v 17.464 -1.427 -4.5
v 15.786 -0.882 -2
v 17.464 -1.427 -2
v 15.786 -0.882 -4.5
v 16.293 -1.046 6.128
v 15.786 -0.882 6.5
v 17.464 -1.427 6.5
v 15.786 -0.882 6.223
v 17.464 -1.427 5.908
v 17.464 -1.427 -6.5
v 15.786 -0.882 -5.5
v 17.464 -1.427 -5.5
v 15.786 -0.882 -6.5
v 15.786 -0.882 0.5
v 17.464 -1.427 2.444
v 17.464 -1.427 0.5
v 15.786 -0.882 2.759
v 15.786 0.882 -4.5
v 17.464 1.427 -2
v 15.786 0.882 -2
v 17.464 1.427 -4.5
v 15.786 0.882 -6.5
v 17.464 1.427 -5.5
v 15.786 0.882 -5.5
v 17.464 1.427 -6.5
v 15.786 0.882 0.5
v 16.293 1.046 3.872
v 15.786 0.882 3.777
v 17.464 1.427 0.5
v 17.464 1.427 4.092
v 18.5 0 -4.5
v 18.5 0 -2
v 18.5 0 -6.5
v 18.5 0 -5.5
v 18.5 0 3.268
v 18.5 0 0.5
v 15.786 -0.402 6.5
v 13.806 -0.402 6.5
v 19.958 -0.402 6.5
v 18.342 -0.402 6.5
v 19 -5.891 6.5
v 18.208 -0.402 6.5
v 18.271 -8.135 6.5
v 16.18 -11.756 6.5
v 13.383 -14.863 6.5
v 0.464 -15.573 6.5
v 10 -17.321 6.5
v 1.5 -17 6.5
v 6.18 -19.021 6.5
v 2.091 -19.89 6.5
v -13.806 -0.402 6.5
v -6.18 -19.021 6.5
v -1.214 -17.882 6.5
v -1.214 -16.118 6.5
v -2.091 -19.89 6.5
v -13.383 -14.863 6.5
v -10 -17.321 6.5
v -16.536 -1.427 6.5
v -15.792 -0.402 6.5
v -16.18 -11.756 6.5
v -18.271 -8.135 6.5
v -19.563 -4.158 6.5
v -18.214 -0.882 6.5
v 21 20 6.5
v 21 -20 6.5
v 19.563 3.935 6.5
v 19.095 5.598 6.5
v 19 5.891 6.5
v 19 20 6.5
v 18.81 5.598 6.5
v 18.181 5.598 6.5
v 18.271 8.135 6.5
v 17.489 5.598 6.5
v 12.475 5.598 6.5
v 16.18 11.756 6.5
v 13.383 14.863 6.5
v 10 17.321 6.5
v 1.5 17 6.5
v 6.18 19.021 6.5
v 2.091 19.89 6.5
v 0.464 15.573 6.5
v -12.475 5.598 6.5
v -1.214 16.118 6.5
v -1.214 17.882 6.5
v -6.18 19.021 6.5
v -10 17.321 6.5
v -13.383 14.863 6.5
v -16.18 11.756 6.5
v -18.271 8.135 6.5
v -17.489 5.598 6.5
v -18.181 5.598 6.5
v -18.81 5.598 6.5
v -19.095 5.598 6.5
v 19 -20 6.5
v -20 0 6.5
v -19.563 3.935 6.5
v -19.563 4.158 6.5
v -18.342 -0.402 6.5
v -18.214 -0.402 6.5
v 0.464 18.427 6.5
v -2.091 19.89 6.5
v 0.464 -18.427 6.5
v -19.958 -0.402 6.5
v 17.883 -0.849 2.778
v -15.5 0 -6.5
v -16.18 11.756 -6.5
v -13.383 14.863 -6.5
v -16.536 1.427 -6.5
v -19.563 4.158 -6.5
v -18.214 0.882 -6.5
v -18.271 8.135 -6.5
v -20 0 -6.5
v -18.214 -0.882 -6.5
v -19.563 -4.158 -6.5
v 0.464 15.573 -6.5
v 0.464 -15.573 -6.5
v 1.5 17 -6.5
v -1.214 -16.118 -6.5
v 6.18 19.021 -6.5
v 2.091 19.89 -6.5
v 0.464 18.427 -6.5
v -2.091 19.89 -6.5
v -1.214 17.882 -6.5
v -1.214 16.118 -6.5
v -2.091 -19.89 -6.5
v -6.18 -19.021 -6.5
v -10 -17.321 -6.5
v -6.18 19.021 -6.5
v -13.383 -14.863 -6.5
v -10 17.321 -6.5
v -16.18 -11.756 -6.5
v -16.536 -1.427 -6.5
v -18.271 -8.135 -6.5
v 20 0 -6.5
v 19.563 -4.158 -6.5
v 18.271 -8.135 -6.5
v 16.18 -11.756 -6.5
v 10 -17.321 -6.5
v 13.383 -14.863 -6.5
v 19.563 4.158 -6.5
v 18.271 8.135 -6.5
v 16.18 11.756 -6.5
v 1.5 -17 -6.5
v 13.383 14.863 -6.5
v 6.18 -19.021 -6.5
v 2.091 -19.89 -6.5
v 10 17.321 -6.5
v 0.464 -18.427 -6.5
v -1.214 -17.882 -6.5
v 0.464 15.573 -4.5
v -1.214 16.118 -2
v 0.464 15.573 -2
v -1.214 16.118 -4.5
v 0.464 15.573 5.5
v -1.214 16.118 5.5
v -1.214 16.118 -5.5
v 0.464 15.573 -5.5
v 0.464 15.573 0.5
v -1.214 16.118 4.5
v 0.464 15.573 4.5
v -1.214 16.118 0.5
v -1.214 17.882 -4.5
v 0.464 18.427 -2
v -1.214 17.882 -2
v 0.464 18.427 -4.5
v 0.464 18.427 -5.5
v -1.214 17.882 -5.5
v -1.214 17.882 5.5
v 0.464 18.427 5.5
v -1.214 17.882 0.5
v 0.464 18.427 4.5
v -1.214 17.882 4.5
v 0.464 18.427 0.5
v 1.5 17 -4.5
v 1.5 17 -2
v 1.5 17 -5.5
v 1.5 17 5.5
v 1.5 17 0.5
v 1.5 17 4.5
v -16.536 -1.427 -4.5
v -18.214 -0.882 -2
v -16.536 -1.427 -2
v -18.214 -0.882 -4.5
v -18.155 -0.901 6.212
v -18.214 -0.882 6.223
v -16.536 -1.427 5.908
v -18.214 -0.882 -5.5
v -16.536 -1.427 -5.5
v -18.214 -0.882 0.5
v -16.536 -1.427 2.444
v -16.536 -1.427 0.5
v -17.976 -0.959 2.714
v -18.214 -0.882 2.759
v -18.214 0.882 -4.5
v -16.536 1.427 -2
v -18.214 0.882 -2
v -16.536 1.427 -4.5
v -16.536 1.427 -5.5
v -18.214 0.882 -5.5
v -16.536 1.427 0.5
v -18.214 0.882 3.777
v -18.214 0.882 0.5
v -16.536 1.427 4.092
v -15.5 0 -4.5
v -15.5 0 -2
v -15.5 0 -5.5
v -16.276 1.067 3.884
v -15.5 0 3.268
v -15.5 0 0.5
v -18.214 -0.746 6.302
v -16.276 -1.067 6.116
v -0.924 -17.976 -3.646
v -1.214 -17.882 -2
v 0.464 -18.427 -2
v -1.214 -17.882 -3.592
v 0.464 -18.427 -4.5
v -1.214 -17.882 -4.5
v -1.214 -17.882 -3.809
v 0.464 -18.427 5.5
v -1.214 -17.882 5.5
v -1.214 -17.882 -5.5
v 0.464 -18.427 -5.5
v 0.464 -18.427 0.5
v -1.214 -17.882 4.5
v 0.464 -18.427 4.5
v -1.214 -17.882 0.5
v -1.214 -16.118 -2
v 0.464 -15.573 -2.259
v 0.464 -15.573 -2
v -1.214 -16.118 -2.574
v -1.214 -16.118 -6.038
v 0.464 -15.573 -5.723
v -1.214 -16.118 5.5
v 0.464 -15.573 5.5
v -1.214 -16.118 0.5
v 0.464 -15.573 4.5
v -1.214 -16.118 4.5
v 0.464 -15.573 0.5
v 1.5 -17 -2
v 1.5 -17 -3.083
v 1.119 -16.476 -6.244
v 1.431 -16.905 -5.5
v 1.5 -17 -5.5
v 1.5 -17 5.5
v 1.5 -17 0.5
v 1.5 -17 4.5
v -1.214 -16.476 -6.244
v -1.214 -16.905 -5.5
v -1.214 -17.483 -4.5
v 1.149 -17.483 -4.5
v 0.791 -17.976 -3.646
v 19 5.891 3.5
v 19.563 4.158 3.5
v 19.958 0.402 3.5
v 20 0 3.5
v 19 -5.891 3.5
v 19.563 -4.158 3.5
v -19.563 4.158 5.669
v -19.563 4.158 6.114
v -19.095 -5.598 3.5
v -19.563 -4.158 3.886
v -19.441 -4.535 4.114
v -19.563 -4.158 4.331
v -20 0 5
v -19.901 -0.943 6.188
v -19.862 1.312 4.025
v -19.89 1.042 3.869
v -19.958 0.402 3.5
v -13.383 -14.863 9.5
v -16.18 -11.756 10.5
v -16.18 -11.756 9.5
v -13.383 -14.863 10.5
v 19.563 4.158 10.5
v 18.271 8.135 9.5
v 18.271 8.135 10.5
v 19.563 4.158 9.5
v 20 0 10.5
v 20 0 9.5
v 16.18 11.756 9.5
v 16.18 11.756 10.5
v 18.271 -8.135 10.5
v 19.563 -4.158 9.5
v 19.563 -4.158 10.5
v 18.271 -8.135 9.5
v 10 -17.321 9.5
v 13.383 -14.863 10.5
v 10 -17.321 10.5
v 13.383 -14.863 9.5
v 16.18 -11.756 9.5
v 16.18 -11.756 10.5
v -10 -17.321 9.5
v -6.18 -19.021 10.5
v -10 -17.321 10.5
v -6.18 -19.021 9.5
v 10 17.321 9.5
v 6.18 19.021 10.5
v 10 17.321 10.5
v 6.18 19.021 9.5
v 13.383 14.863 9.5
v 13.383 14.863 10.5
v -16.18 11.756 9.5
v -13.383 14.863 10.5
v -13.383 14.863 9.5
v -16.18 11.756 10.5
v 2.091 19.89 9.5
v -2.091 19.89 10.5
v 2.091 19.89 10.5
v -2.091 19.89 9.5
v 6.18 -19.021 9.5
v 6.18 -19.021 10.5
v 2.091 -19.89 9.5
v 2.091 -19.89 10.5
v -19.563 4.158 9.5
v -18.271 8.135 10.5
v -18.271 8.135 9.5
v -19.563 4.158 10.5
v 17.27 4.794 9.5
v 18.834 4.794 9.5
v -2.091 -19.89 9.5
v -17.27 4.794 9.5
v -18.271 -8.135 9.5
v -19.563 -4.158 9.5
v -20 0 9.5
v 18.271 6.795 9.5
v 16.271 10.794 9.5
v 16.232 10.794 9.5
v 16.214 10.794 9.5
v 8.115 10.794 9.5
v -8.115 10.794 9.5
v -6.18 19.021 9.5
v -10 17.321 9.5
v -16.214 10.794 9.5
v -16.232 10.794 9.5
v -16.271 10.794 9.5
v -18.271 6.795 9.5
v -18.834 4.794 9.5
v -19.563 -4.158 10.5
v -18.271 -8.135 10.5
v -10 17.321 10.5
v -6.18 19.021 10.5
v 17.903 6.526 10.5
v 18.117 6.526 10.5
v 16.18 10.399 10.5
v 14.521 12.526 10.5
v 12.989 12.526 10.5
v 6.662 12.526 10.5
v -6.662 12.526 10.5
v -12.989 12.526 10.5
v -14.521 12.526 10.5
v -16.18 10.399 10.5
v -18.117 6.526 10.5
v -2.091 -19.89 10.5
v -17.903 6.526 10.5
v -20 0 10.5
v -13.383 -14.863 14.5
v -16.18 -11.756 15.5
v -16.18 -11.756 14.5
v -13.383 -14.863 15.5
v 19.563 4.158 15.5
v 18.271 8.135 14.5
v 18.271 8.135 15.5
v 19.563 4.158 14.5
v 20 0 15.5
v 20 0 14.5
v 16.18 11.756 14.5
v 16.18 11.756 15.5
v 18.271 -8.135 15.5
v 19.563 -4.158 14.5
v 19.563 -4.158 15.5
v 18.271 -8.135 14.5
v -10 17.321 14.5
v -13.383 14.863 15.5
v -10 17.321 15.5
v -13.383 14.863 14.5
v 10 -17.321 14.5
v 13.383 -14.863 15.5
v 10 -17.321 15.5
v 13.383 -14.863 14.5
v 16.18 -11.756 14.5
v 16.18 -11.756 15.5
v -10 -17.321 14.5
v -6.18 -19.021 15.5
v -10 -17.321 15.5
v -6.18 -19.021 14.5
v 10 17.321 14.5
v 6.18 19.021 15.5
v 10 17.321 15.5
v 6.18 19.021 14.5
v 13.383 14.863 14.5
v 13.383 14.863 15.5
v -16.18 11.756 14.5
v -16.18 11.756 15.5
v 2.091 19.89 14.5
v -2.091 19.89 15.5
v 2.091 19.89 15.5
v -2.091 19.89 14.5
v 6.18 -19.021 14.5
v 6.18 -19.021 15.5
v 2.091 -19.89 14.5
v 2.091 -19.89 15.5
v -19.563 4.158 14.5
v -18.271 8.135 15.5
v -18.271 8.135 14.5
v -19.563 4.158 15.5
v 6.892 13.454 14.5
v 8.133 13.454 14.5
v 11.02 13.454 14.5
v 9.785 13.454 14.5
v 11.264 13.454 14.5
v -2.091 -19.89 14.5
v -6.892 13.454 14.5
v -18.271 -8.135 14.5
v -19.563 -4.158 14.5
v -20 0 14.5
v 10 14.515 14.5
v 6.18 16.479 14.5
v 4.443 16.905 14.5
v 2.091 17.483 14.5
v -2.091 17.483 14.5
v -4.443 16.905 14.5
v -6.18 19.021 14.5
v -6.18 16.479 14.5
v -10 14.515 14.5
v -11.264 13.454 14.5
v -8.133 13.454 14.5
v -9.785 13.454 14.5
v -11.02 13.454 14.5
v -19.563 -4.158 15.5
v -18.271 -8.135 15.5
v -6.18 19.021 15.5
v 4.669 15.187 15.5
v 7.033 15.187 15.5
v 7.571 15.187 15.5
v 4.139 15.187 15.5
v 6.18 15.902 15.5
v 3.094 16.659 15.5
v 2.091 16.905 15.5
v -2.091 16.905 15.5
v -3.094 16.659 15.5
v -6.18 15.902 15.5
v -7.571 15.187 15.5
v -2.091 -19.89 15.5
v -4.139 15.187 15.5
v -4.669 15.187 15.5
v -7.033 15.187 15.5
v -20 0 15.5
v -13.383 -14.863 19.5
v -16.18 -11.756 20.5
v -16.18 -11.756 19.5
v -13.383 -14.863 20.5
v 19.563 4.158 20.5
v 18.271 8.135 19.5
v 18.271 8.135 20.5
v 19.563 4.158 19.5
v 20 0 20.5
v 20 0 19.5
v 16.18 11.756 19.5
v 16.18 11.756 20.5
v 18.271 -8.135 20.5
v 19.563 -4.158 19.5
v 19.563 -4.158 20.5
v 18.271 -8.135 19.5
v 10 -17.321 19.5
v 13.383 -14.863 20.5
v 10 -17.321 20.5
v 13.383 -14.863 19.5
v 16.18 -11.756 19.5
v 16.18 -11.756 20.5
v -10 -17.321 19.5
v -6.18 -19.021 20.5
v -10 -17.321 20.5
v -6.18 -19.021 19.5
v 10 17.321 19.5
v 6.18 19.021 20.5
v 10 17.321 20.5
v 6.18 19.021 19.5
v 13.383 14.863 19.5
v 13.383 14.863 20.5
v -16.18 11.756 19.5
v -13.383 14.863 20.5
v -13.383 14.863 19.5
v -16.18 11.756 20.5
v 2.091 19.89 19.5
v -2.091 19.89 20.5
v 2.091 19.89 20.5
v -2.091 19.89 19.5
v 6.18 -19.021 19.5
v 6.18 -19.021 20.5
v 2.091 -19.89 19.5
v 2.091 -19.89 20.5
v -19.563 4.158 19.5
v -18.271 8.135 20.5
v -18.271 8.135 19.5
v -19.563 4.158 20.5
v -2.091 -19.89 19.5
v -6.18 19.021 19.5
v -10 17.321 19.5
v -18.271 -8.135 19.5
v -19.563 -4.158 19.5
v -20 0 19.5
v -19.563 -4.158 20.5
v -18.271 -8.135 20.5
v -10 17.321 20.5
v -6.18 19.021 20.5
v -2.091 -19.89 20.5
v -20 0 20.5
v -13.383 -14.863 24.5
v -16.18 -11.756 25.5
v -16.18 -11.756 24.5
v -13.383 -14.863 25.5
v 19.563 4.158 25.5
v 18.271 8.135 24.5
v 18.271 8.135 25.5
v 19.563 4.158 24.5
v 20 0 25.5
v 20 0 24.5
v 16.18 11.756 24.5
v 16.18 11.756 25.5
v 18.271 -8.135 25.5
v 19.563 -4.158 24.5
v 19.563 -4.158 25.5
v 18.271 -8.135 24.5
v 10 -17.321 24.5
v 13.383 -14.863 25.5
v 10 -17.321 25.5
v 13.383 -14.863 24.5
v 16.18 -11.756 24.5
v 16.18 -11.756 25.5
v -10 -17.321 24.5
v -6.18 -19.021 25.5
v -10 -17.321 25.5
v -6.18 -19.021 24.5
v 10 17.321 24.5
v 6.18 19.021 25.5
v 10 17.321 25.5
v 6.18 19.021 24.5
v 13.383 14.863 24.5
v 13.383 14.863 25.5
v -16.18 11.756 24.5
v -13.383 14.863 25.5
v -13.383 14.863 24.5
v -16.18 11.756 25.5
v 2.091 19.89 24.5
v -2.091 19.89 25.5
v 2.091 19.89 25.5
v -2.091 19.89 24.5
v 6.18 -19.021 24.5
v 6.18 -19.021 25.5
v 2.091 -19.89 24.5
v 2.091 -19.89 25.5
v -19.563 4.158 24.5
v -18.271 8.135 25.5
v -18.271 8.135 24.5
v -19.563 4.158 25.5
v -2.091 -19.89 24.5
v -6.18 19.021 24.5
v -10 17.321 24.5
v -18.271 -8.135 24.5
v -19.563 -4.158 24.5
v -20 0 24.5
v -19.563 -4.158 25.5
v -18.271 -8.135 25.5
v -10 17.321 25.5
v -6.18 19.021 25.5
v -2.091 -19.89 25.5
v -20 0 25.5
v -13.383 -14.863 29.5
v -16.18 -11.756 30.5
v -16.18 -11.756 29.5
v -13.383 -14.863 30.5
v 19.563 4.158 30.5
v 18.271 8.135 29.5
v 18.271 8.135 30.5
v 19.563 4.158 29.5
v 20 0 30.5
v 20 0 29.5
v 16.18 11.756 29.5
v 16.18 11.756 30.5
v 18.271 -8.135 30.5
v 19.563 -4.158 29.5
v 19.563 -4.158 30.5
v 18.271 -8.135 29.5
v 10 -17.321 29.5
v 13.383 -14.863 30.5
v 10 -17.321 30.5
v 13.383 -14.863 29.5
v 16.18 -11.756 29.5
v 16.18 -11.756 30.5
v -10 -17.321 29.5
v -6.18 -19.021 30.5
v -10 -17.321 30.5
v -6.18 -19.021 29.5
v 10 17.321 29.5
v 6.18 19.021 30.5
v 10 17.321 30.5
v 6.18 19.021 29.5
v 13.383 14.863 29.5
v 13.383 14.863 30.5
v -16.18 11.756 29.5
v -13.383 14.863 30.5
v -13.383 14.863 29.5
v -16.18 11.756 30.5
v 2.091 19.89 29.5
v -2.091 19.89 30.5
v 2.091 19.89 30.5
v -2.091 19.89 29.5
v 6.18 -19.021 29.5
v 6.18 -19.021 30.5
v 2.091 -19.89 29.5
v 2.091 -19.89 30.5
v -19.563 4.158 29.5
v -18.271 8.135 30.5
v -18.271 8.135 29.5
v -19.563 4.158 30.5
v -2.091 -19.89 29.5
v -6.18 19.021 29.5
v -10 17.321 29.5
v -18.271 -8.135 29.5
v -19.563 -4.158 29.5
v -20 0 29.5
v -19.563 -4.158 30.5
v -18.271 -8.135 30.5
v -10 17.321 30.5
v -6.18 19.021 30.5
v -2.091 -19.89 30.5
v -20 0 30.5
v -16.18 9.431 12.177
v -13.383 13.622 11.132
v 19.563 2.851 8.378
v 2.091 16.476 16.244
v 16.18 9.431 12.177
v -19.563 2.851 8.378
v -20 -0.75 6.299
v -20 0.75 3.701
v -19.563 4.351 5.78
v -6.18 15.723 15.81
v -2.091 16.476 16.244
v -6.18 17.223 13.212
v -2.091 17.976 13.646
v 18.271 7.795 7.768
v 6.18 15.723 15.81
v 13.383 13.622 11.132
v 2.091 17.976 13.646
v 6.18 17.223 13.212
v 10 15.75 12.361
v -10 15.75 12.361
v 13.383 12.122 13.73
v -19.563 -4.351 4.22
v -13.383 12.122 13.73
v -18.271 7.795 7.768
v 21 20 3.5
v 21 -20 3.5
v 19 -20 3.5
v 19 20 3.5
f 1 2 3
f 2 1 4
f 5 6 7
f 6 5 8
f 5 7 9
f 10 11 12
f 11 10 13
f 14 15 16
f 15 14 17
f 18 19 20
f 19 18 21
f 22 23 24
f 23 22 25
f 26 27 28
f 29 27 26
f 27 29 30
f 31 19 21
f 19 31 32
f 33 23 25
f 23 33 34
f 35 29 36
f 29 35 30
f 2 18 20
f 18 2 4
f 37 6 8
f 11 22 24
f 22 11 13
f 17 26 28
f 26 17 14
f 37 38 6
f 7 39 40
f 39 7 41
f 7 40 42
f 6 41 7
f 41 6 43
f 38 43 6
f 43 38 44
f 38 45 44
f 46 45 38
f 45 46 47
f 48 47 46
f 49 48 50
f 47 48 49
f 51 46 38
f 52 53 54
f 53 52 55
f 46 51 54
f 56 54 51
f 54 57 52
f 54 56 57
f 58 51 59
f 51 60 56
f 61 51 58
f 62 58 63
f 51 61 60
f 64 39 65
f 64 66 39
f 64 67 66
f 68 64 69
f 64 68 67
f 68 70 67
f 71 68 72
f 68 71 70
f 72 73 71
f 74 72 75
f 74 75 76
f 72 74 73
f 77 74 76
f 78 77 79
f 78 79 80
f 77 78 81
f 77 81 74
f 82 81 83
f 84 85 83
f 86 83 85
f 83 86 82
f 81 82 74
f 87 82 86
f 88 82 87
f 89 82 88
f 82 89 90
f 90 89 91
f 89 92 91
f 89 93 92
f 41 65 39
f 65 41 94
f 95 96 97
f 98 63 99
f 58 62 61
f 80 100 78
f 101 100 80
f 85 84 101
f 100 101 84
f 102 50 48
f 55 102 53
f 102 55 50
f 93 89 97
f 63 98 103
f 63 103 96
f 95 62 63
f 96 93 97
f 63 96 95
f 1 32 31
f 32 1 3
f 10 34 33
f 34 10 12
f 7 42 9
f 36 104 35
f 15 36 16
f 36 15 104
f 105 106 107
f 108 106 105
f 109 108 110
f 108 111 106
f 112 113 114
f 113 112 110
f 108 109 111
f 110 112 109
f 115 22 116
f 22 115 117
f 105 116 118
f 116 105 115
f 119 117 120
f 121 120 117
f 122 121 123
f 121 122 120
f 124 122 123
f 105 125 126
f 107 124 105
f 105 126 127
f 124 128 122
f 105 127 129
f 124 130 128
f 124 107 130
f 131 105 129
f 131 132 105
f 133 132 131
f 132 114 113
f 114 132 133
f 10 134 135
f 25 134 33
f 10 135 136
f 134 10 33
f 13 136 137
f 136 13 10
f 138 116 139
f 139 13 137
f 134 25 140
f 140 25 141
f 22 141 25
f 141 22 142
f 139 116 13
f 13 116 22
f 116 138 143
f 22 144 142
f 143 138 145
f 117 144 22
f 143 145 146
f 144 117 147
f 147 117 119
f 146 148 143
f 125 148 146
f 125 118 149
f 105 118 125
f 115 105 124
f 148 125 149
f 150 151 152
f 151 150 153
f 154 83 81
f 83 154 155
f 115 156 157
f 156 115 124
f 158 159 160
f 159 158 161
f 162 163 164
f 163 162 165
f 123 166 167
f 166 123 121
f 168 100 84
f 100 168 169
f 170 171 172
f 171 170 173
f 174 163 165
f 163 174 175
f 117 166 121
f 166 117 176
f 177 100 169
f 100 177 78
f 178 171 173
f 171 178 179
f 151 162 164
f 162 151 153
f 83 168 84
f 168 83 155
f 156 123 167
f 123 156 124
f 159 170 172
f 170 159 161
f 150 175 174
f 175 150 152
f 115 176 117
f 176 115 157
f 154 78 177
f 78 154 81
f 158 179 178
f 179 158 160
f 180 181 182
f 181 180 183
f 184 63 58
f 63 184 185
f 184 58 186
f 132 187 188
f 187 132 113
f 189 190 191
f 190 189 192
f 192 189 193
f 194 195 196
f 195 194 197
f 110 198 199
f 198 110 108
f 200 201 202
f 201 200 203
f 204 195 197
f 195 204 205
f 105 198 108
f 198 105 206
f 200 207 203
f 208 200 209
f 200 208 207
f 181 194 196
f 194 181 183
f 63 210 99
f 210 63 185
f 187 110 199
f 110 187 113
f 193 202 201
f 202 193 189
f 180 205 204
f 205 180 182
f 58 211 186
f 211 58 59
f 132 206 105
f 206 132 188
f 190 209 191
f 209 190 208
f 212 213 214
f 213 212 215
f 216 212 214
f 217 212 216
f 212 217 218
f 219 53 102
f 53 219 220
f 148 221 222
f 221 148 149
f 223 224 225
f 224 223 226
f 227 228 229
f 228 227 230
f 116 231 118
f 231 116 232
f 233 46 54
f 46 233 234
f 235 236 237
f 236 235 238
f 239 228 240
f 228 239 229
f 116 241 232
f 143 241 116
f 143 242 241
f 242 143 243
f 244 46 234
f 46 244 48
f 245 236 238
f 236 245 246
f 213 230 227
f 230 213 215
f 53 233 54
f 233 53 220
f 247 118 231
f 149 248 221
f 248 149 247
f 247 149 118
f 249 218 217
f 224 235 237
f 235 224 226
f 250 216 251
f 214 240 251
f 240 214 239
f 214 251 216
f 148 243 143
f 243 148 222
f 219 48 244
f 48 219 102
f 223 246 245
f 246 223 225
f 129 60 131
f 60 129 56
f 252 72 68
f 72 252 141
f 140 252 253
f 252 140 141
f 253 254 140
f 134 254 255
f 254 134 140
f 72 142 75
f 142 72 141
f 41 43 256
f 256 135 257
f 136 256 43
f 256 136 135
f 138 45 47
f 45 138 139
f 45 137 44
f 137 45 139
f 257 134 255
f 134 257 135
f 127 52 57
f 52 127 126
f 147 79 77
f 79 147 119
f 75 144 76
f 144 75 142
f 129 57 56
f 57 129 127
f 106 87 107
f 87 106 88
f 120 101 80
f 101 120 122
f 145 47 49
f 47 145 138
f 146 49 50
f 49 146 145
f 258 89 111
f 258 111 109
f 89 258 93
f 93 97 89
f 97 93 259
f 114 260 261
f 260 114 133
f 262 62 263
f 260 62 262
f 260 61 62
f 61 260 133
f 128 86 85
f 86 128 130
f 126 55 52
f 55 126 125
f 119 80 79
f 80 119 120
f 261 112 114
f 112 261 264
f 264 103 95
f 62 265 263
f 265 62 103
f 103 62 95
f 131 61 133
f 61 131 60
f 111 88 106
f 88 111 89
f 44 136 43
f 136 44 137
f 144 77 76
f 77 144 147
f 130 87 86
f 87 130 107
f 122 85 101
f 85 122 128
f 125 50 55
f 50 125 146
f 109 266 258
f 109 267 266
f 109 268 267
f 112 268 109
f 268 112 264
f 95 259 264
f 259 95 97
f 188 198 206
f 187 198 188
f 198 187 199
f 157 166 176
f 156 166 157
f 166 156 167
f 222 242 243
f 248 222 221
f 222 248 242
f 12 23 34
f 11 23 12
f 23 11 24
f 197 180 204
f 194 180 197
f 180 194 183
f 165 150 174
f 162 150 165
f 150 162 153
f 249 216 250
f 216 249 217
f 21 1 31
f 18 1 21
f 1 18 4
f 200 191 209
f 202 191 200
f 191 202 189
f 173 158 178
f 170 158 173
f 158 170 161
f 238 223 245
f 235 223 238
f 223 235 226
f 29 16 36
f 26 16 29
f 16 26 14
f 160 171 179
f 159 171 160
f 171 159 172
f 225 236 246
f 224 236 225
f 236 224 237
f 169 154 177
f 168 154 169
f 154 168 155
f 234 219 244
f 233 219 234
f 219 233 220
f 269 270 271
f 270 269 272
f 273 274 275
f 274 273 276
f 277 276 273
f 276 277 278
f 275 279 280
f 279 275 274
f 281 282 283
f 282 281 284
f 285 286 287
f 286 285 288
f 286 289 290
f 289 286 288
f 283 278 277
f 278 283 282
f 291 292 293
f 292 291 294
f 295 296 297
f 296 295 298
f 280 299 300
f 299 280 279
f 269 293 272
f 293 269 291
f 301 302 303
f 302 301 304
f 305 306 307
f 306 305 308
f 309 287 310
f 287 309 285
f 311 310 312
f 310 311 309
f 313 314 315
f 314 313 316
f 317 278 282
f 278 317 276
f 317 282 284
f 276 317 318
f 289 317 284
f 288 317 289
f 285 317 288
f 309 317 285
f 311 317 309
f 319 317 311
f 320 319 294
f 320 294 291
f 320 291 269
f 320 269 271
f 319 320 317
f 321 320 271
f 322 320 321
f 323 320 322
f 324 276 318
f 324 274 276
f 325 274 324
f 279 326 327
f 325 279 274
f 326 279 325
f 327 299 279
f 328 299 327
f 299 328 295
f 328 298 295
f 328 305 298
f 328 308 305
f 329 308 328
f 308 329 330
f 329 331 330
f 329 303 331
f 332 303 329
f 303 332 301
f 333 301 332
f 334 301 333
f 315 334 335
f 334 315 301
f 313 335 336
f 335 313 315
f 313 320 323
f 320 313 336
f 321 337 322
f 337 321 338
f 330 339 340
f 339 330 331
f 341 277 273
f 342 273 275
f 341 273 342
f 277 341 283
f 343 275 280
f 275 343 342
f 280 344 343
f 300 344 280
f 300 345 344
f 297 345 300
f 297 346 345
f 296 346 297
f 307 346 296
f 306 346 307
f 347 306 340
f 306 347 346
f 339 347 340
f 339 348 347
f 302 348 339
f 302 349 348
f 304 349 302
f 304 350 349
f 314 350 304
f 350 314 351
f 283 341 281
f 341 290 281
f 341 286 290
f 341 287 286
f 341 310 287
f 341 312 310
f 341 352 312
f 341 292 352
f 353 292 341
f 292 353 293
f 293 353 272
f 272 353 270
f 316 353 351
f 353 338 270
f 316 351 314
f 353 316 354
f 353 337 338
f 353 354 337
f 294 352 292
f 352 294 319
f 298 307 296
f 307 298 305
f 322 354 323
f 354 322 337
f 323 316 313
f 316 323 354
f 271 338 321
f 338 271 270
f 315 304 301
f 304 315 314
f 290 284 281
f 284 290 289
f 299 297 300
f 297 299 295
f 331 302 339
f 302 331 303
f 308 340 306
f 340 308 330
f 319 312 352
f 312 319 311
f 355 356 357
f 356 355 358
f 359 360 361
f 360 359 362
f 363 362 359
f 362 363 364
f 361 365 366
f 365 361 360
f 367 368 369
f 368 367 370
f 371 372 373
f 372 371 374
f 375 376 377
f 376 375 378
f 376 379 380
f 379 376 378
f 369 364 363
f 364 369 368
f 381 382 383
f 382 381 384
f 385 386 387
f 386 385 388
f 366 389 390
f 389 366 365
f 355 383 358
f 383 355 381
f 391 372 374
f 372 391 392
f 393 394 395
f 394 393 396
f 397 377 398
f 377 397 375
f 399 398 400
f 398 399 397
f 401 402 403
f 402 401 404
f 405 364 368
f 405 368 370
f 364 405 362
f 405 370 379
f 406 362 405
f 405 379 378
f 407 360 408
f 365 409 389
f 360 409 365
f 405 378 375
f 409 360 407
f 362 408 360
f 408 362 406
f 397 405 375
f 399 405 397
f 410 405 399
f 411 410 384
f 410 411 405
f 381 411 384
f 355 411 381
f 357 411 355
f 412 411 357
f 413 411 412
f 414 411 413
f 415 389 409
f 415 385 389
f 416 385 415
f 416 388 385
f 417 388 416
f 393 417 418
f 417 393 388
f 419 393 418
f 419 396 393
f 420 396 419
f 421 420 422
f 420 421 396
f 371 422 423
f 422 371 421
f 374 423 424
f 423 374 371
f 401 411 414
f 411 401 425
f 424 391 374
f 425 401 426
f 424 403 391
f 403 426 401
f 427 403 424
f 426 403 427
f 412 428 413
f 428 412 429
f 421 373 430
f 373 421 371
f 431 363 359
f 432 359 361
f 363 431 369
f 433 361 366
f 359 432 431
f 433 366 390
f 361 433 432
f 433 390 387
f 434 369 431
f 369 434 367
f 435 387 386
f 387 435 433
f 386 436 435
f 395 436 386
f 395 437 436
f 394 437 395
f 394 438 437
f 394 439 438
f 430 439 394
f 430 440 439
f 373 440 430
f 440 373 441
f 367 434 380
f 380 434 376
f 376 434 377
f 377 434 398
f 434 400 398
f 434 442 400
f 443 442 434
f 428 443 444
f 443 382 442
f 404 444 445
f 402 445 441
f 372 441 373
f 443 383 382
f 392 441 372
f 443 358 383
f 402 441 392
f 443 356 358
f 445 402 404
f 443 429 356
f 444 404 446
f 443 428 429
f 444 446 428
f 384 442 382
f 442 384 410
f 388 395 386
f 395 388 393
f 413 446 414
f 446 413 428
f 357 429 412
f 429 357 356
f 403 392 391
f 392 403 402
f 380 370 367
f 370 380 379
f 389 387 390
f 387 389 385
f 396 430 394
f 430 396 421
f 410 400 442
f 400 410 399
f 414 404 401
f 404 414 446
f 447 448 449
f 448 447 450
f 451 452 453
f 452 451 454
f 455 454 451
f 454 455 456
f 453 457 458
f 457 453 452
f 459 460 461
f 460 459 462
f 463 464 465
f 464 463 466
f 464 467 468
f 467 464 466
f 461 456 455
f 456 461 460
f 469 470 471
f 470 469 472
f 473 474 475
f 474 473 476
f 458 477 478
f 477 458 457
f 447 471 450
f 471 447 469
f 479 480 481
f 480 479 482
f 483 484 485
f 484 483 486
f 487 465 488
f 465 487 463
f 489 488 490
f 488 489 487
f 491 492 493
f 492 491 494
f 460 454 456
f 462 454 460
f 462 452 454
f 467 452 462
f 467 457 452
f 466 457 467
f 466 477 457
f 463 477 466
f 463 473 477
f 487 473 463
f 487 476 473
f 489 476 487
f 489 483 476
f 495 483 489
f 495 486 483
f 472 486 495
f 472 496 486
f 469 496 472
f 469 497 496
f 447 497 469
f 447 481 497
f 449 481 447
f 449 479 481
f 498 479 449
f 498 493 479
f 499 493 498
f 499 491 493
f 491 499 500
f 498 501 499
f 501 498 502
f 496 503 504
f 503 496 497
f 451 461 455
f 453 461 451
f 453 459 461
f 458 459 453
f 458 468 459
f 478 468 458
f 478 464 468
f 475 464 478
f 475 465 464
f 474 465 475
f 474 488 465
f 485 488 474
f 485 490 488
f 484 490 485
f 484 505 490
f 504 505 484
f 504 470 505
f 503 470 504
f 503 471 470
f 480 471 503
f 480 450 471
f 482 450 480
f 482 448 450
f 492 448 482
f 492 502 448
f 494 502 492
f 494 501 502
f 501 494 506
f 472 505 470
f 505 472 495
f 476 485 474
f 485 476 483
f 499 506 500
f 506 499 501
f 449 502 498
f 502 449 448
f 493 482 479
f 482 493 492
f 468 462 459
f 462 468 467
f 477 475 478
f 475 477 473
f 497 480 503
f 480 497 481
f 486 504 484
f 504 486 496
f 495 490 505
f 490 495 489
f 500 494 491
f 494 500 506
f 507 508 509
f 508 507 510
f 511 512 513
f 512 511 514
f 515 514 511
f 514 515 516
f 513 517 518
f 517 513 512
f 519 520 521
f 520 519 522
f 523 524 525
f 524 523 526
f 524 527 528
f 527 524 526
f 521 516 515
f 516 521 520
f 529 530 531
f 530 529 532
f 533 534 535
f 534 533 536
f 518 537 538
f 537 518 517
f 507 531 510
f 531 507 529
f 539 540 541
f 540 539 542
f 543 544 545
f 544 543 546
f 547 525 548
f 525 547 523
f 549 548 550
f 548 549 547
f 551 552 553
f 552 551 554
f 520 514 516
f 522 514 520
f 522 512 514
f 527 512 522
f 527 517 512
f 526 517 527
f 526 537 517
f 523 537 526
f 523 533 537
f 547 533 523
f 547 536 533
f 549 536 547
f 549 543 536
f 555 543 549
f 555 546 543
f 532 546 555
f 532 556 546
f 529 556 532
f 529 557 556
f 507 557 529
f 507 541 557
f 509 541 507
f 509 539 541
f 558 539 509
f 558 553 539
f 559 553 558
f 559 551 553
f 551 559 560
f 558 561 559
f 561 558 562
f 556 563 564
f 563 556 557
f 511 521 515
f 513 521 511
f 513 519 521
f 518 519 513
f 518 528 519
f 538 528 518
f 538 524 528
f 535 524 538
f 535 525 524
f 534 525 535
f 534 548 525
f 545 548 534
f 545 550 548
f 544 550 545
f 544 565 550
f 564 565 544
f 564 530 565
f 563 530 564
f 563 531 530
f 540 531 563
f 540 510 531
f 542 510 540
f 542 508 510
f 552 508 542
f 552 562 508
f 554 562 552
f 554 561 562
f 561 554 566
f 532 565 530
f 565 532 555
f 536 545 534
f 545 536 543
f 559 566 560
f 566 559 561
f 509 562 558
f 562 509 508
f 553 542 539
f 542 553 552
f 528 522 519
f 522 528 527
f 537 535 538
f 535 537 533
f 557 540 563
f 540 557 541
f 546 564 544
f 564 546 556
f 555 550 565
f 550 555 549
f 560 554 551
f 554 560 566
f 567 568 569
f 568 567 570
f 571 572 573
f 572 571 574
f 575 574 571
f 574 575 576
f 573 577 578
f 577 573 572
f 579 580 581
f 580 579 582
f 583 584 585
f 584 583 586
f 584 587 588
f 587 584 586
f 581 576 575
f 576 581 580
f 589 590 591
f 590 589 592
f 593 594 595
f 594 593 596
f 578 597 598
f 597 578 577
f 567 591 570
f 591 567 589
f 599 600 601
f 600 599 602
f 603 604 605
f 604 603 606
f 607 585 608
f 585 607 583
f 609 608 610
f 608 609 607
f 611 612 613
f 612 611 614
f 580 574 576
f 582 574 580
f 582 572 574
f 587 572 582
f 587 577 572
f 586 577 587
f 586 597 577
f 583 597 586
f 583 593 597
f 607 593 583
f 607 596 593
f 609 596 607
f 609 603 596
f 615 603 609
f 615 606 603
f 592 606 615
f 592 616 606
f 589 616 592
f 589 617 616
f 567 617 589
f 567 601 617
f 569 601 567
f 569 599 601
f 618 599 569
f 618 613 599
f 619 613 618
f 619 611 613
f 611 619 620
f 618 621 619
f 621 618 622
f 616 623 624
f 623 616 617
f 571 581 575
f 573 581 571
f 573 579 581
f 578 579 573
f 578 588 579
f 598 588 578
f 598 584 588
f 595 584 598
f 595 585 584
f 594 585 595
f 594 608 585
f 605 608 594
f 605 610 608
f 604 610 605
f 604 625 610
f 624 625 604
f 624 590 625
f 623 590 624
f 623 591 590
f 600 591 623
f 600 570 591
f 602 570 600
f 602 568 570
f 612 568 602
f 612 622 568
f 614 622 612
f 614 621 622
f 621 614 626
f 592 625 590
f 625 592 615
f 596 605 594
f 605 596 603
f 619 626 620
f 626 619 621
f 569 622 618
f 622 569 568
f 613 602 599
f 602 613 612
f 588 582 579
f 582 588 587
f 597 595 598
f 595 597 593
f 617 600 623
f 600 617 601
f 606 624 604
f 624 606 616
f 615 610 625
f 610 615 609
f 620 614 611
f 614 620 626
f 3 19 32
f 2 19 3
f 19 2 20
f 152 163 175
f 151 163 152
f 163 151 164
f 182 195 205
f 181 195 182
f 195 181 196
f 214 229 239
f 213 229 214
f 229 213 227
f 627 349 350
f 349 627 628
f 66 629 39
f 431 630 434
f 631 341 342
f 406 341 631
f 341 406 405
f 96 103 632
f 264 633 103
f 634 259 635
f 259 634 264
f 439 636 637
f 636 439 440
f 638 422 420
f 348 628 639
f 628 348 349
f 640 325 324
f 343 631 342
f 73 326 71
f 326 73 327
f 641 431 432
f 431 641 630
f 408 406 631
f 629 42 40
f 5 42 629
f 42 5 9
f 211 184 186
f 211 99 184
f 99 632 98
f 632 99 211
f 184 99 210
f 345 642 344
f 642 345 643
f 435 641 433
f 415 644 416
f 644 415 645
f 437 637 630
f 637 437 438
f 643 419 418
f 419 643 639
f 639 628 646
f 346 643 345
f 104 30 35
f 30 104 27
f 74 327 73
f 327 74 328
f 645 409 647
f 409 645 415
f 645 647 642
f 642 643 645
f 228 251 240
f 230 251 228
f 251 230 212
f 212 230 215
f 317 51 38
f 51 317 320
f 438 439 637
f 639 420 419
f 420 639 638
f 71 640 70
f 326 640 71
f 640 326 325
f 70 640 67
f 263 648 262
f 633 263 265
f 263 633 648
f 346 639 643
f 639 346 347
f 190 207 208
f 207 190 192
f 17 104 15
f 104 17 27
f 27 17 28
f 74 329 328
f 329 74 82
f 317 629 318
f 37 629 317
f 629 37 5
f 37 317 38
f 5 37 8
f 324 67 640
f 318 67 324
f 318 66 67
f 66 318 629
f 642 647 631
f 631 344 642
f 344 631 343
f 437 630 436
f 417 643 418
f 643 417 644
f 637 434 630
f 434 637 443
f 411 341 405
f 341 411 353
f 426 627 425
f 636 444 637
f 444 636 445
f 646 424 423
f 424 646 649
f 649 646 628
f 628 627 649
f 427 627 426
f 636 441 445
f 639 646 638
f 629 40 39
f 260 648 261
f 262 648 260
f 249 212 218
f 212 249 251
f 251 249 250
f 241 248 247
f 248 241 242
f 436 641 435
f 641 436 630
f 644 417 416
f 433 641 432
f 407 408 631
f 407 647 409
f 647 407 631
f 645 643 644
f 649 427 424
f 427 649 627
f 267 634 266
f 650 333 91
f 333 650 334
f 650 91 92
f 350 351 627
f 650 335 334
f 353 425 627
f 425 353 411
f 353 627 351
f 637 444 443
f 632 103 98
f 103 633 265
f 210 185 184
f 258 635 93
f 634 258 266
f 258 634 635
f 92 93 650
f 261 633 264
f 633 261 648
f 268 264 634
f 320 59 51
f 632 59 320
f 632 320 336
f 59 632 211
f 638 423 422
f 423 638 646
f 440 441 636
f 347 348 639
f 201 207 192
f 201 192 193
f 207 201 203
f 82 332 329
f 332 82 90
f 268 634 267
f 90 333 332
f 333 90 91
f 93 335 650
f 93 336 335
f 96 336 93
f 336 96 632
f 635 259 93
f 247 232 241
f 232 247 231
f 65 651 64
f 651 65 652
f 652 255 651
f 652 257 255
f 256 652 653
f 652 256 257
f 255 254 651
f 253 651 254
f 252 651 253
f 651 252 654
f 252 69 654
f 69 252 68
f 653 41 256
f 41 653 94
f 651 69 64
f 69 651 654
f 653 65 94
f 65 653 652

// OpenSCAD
union() {
	difference() {
		difference() {
			cylinder(center = true, h = 13, r = 20.0000000000);
			union() {
				translate(v = [17.0000000000, 0.0000000000, 0]) {
					cylinder(center = true, h = 13, r = 1.5000000000);
				}
				translate(v = [0.0000000000, 17.0000000000, 0]) {
					cylinder(center = true, h = 13, r = 1.5000000000);
				}
				translate(v = [-17.0000000000, 0.0000000000, 0]) {
					cylinder(center = true, h = 13, r = 1.5000000000);
				}
				translate(v = [-0.0000000000, -17.0000000000, 0]) {
					cylinder(center = true, h = 13, r = 1.5000000000);
				}
			}
		}
	}
	union() {
		translate(v = [0, 0, -5.0000000000]) {
			cylinder(center = true, h = 1, r = 20.0000000000);
		}
		translate(v = [0, 0, 0.0000000000]) {
			cylinder(center = true, h = 1, r = 20.0000000000);
		}
		translate(v = [0, 0, 5.0000000000]) {
			cylinder(center = true, h = 1, r = 20.0000000000);
		}
		translate(v = [0, 0, 10.0000000000]) {
			cylinder(center = true, h = 1, r = 20.0000000000);
		}
		translate(v = [0, 0, 15.0000000000]) {
			cylinder(center = true, h = 1, r = 20.0000000000);
		}
		translate(v = [0, 0, 20.0000000000]) {
			cylinder(center = true, h = 1, r = 20.0000000000);
		}
		translate(v = [0, 0, 25.0000000000]) {
			cylinder(center = true, h = 1, r = 20.0000000000);
		}
		translate(v = [0, 0, 30.0000000000]) {
			cylinder(center = true, h = 1, r = 20.0000000000);
		}
	}
	union() {
		translate(v = [17.0000000000, 0.0000000000, -2]) {
			cylinder(center = false, h = 2, r = 1.5000000000);
		}
		translate(v = [0.0000000000, 17.0000000000, -2]) {
			cylinder(center = false, h = 2, r = 1.5000000000);
		}
		translate(v = [-17.0000000000, 0.0000000000, -2]) {
			cylinder(center = false, h = 2, r = 1.5000000000);
		}
		translate(v = [-0.0000000000, -17.0000000000, -2]) {
			cylinder(center = false, h = 2, r = 1.5000000000);
		}
	}
	translate(v = [0, 0, 5.0000000000]) {
		rotate(a = [30, 0, 0]) {
			cylinder(center = true, h = 3, r = 20.0000000000);
		}
	}
	translate(v = [20.0000000000, 0, 5.0000000000]) {
		cube(center = true, size = [2, 40, 3]);
	}
}
